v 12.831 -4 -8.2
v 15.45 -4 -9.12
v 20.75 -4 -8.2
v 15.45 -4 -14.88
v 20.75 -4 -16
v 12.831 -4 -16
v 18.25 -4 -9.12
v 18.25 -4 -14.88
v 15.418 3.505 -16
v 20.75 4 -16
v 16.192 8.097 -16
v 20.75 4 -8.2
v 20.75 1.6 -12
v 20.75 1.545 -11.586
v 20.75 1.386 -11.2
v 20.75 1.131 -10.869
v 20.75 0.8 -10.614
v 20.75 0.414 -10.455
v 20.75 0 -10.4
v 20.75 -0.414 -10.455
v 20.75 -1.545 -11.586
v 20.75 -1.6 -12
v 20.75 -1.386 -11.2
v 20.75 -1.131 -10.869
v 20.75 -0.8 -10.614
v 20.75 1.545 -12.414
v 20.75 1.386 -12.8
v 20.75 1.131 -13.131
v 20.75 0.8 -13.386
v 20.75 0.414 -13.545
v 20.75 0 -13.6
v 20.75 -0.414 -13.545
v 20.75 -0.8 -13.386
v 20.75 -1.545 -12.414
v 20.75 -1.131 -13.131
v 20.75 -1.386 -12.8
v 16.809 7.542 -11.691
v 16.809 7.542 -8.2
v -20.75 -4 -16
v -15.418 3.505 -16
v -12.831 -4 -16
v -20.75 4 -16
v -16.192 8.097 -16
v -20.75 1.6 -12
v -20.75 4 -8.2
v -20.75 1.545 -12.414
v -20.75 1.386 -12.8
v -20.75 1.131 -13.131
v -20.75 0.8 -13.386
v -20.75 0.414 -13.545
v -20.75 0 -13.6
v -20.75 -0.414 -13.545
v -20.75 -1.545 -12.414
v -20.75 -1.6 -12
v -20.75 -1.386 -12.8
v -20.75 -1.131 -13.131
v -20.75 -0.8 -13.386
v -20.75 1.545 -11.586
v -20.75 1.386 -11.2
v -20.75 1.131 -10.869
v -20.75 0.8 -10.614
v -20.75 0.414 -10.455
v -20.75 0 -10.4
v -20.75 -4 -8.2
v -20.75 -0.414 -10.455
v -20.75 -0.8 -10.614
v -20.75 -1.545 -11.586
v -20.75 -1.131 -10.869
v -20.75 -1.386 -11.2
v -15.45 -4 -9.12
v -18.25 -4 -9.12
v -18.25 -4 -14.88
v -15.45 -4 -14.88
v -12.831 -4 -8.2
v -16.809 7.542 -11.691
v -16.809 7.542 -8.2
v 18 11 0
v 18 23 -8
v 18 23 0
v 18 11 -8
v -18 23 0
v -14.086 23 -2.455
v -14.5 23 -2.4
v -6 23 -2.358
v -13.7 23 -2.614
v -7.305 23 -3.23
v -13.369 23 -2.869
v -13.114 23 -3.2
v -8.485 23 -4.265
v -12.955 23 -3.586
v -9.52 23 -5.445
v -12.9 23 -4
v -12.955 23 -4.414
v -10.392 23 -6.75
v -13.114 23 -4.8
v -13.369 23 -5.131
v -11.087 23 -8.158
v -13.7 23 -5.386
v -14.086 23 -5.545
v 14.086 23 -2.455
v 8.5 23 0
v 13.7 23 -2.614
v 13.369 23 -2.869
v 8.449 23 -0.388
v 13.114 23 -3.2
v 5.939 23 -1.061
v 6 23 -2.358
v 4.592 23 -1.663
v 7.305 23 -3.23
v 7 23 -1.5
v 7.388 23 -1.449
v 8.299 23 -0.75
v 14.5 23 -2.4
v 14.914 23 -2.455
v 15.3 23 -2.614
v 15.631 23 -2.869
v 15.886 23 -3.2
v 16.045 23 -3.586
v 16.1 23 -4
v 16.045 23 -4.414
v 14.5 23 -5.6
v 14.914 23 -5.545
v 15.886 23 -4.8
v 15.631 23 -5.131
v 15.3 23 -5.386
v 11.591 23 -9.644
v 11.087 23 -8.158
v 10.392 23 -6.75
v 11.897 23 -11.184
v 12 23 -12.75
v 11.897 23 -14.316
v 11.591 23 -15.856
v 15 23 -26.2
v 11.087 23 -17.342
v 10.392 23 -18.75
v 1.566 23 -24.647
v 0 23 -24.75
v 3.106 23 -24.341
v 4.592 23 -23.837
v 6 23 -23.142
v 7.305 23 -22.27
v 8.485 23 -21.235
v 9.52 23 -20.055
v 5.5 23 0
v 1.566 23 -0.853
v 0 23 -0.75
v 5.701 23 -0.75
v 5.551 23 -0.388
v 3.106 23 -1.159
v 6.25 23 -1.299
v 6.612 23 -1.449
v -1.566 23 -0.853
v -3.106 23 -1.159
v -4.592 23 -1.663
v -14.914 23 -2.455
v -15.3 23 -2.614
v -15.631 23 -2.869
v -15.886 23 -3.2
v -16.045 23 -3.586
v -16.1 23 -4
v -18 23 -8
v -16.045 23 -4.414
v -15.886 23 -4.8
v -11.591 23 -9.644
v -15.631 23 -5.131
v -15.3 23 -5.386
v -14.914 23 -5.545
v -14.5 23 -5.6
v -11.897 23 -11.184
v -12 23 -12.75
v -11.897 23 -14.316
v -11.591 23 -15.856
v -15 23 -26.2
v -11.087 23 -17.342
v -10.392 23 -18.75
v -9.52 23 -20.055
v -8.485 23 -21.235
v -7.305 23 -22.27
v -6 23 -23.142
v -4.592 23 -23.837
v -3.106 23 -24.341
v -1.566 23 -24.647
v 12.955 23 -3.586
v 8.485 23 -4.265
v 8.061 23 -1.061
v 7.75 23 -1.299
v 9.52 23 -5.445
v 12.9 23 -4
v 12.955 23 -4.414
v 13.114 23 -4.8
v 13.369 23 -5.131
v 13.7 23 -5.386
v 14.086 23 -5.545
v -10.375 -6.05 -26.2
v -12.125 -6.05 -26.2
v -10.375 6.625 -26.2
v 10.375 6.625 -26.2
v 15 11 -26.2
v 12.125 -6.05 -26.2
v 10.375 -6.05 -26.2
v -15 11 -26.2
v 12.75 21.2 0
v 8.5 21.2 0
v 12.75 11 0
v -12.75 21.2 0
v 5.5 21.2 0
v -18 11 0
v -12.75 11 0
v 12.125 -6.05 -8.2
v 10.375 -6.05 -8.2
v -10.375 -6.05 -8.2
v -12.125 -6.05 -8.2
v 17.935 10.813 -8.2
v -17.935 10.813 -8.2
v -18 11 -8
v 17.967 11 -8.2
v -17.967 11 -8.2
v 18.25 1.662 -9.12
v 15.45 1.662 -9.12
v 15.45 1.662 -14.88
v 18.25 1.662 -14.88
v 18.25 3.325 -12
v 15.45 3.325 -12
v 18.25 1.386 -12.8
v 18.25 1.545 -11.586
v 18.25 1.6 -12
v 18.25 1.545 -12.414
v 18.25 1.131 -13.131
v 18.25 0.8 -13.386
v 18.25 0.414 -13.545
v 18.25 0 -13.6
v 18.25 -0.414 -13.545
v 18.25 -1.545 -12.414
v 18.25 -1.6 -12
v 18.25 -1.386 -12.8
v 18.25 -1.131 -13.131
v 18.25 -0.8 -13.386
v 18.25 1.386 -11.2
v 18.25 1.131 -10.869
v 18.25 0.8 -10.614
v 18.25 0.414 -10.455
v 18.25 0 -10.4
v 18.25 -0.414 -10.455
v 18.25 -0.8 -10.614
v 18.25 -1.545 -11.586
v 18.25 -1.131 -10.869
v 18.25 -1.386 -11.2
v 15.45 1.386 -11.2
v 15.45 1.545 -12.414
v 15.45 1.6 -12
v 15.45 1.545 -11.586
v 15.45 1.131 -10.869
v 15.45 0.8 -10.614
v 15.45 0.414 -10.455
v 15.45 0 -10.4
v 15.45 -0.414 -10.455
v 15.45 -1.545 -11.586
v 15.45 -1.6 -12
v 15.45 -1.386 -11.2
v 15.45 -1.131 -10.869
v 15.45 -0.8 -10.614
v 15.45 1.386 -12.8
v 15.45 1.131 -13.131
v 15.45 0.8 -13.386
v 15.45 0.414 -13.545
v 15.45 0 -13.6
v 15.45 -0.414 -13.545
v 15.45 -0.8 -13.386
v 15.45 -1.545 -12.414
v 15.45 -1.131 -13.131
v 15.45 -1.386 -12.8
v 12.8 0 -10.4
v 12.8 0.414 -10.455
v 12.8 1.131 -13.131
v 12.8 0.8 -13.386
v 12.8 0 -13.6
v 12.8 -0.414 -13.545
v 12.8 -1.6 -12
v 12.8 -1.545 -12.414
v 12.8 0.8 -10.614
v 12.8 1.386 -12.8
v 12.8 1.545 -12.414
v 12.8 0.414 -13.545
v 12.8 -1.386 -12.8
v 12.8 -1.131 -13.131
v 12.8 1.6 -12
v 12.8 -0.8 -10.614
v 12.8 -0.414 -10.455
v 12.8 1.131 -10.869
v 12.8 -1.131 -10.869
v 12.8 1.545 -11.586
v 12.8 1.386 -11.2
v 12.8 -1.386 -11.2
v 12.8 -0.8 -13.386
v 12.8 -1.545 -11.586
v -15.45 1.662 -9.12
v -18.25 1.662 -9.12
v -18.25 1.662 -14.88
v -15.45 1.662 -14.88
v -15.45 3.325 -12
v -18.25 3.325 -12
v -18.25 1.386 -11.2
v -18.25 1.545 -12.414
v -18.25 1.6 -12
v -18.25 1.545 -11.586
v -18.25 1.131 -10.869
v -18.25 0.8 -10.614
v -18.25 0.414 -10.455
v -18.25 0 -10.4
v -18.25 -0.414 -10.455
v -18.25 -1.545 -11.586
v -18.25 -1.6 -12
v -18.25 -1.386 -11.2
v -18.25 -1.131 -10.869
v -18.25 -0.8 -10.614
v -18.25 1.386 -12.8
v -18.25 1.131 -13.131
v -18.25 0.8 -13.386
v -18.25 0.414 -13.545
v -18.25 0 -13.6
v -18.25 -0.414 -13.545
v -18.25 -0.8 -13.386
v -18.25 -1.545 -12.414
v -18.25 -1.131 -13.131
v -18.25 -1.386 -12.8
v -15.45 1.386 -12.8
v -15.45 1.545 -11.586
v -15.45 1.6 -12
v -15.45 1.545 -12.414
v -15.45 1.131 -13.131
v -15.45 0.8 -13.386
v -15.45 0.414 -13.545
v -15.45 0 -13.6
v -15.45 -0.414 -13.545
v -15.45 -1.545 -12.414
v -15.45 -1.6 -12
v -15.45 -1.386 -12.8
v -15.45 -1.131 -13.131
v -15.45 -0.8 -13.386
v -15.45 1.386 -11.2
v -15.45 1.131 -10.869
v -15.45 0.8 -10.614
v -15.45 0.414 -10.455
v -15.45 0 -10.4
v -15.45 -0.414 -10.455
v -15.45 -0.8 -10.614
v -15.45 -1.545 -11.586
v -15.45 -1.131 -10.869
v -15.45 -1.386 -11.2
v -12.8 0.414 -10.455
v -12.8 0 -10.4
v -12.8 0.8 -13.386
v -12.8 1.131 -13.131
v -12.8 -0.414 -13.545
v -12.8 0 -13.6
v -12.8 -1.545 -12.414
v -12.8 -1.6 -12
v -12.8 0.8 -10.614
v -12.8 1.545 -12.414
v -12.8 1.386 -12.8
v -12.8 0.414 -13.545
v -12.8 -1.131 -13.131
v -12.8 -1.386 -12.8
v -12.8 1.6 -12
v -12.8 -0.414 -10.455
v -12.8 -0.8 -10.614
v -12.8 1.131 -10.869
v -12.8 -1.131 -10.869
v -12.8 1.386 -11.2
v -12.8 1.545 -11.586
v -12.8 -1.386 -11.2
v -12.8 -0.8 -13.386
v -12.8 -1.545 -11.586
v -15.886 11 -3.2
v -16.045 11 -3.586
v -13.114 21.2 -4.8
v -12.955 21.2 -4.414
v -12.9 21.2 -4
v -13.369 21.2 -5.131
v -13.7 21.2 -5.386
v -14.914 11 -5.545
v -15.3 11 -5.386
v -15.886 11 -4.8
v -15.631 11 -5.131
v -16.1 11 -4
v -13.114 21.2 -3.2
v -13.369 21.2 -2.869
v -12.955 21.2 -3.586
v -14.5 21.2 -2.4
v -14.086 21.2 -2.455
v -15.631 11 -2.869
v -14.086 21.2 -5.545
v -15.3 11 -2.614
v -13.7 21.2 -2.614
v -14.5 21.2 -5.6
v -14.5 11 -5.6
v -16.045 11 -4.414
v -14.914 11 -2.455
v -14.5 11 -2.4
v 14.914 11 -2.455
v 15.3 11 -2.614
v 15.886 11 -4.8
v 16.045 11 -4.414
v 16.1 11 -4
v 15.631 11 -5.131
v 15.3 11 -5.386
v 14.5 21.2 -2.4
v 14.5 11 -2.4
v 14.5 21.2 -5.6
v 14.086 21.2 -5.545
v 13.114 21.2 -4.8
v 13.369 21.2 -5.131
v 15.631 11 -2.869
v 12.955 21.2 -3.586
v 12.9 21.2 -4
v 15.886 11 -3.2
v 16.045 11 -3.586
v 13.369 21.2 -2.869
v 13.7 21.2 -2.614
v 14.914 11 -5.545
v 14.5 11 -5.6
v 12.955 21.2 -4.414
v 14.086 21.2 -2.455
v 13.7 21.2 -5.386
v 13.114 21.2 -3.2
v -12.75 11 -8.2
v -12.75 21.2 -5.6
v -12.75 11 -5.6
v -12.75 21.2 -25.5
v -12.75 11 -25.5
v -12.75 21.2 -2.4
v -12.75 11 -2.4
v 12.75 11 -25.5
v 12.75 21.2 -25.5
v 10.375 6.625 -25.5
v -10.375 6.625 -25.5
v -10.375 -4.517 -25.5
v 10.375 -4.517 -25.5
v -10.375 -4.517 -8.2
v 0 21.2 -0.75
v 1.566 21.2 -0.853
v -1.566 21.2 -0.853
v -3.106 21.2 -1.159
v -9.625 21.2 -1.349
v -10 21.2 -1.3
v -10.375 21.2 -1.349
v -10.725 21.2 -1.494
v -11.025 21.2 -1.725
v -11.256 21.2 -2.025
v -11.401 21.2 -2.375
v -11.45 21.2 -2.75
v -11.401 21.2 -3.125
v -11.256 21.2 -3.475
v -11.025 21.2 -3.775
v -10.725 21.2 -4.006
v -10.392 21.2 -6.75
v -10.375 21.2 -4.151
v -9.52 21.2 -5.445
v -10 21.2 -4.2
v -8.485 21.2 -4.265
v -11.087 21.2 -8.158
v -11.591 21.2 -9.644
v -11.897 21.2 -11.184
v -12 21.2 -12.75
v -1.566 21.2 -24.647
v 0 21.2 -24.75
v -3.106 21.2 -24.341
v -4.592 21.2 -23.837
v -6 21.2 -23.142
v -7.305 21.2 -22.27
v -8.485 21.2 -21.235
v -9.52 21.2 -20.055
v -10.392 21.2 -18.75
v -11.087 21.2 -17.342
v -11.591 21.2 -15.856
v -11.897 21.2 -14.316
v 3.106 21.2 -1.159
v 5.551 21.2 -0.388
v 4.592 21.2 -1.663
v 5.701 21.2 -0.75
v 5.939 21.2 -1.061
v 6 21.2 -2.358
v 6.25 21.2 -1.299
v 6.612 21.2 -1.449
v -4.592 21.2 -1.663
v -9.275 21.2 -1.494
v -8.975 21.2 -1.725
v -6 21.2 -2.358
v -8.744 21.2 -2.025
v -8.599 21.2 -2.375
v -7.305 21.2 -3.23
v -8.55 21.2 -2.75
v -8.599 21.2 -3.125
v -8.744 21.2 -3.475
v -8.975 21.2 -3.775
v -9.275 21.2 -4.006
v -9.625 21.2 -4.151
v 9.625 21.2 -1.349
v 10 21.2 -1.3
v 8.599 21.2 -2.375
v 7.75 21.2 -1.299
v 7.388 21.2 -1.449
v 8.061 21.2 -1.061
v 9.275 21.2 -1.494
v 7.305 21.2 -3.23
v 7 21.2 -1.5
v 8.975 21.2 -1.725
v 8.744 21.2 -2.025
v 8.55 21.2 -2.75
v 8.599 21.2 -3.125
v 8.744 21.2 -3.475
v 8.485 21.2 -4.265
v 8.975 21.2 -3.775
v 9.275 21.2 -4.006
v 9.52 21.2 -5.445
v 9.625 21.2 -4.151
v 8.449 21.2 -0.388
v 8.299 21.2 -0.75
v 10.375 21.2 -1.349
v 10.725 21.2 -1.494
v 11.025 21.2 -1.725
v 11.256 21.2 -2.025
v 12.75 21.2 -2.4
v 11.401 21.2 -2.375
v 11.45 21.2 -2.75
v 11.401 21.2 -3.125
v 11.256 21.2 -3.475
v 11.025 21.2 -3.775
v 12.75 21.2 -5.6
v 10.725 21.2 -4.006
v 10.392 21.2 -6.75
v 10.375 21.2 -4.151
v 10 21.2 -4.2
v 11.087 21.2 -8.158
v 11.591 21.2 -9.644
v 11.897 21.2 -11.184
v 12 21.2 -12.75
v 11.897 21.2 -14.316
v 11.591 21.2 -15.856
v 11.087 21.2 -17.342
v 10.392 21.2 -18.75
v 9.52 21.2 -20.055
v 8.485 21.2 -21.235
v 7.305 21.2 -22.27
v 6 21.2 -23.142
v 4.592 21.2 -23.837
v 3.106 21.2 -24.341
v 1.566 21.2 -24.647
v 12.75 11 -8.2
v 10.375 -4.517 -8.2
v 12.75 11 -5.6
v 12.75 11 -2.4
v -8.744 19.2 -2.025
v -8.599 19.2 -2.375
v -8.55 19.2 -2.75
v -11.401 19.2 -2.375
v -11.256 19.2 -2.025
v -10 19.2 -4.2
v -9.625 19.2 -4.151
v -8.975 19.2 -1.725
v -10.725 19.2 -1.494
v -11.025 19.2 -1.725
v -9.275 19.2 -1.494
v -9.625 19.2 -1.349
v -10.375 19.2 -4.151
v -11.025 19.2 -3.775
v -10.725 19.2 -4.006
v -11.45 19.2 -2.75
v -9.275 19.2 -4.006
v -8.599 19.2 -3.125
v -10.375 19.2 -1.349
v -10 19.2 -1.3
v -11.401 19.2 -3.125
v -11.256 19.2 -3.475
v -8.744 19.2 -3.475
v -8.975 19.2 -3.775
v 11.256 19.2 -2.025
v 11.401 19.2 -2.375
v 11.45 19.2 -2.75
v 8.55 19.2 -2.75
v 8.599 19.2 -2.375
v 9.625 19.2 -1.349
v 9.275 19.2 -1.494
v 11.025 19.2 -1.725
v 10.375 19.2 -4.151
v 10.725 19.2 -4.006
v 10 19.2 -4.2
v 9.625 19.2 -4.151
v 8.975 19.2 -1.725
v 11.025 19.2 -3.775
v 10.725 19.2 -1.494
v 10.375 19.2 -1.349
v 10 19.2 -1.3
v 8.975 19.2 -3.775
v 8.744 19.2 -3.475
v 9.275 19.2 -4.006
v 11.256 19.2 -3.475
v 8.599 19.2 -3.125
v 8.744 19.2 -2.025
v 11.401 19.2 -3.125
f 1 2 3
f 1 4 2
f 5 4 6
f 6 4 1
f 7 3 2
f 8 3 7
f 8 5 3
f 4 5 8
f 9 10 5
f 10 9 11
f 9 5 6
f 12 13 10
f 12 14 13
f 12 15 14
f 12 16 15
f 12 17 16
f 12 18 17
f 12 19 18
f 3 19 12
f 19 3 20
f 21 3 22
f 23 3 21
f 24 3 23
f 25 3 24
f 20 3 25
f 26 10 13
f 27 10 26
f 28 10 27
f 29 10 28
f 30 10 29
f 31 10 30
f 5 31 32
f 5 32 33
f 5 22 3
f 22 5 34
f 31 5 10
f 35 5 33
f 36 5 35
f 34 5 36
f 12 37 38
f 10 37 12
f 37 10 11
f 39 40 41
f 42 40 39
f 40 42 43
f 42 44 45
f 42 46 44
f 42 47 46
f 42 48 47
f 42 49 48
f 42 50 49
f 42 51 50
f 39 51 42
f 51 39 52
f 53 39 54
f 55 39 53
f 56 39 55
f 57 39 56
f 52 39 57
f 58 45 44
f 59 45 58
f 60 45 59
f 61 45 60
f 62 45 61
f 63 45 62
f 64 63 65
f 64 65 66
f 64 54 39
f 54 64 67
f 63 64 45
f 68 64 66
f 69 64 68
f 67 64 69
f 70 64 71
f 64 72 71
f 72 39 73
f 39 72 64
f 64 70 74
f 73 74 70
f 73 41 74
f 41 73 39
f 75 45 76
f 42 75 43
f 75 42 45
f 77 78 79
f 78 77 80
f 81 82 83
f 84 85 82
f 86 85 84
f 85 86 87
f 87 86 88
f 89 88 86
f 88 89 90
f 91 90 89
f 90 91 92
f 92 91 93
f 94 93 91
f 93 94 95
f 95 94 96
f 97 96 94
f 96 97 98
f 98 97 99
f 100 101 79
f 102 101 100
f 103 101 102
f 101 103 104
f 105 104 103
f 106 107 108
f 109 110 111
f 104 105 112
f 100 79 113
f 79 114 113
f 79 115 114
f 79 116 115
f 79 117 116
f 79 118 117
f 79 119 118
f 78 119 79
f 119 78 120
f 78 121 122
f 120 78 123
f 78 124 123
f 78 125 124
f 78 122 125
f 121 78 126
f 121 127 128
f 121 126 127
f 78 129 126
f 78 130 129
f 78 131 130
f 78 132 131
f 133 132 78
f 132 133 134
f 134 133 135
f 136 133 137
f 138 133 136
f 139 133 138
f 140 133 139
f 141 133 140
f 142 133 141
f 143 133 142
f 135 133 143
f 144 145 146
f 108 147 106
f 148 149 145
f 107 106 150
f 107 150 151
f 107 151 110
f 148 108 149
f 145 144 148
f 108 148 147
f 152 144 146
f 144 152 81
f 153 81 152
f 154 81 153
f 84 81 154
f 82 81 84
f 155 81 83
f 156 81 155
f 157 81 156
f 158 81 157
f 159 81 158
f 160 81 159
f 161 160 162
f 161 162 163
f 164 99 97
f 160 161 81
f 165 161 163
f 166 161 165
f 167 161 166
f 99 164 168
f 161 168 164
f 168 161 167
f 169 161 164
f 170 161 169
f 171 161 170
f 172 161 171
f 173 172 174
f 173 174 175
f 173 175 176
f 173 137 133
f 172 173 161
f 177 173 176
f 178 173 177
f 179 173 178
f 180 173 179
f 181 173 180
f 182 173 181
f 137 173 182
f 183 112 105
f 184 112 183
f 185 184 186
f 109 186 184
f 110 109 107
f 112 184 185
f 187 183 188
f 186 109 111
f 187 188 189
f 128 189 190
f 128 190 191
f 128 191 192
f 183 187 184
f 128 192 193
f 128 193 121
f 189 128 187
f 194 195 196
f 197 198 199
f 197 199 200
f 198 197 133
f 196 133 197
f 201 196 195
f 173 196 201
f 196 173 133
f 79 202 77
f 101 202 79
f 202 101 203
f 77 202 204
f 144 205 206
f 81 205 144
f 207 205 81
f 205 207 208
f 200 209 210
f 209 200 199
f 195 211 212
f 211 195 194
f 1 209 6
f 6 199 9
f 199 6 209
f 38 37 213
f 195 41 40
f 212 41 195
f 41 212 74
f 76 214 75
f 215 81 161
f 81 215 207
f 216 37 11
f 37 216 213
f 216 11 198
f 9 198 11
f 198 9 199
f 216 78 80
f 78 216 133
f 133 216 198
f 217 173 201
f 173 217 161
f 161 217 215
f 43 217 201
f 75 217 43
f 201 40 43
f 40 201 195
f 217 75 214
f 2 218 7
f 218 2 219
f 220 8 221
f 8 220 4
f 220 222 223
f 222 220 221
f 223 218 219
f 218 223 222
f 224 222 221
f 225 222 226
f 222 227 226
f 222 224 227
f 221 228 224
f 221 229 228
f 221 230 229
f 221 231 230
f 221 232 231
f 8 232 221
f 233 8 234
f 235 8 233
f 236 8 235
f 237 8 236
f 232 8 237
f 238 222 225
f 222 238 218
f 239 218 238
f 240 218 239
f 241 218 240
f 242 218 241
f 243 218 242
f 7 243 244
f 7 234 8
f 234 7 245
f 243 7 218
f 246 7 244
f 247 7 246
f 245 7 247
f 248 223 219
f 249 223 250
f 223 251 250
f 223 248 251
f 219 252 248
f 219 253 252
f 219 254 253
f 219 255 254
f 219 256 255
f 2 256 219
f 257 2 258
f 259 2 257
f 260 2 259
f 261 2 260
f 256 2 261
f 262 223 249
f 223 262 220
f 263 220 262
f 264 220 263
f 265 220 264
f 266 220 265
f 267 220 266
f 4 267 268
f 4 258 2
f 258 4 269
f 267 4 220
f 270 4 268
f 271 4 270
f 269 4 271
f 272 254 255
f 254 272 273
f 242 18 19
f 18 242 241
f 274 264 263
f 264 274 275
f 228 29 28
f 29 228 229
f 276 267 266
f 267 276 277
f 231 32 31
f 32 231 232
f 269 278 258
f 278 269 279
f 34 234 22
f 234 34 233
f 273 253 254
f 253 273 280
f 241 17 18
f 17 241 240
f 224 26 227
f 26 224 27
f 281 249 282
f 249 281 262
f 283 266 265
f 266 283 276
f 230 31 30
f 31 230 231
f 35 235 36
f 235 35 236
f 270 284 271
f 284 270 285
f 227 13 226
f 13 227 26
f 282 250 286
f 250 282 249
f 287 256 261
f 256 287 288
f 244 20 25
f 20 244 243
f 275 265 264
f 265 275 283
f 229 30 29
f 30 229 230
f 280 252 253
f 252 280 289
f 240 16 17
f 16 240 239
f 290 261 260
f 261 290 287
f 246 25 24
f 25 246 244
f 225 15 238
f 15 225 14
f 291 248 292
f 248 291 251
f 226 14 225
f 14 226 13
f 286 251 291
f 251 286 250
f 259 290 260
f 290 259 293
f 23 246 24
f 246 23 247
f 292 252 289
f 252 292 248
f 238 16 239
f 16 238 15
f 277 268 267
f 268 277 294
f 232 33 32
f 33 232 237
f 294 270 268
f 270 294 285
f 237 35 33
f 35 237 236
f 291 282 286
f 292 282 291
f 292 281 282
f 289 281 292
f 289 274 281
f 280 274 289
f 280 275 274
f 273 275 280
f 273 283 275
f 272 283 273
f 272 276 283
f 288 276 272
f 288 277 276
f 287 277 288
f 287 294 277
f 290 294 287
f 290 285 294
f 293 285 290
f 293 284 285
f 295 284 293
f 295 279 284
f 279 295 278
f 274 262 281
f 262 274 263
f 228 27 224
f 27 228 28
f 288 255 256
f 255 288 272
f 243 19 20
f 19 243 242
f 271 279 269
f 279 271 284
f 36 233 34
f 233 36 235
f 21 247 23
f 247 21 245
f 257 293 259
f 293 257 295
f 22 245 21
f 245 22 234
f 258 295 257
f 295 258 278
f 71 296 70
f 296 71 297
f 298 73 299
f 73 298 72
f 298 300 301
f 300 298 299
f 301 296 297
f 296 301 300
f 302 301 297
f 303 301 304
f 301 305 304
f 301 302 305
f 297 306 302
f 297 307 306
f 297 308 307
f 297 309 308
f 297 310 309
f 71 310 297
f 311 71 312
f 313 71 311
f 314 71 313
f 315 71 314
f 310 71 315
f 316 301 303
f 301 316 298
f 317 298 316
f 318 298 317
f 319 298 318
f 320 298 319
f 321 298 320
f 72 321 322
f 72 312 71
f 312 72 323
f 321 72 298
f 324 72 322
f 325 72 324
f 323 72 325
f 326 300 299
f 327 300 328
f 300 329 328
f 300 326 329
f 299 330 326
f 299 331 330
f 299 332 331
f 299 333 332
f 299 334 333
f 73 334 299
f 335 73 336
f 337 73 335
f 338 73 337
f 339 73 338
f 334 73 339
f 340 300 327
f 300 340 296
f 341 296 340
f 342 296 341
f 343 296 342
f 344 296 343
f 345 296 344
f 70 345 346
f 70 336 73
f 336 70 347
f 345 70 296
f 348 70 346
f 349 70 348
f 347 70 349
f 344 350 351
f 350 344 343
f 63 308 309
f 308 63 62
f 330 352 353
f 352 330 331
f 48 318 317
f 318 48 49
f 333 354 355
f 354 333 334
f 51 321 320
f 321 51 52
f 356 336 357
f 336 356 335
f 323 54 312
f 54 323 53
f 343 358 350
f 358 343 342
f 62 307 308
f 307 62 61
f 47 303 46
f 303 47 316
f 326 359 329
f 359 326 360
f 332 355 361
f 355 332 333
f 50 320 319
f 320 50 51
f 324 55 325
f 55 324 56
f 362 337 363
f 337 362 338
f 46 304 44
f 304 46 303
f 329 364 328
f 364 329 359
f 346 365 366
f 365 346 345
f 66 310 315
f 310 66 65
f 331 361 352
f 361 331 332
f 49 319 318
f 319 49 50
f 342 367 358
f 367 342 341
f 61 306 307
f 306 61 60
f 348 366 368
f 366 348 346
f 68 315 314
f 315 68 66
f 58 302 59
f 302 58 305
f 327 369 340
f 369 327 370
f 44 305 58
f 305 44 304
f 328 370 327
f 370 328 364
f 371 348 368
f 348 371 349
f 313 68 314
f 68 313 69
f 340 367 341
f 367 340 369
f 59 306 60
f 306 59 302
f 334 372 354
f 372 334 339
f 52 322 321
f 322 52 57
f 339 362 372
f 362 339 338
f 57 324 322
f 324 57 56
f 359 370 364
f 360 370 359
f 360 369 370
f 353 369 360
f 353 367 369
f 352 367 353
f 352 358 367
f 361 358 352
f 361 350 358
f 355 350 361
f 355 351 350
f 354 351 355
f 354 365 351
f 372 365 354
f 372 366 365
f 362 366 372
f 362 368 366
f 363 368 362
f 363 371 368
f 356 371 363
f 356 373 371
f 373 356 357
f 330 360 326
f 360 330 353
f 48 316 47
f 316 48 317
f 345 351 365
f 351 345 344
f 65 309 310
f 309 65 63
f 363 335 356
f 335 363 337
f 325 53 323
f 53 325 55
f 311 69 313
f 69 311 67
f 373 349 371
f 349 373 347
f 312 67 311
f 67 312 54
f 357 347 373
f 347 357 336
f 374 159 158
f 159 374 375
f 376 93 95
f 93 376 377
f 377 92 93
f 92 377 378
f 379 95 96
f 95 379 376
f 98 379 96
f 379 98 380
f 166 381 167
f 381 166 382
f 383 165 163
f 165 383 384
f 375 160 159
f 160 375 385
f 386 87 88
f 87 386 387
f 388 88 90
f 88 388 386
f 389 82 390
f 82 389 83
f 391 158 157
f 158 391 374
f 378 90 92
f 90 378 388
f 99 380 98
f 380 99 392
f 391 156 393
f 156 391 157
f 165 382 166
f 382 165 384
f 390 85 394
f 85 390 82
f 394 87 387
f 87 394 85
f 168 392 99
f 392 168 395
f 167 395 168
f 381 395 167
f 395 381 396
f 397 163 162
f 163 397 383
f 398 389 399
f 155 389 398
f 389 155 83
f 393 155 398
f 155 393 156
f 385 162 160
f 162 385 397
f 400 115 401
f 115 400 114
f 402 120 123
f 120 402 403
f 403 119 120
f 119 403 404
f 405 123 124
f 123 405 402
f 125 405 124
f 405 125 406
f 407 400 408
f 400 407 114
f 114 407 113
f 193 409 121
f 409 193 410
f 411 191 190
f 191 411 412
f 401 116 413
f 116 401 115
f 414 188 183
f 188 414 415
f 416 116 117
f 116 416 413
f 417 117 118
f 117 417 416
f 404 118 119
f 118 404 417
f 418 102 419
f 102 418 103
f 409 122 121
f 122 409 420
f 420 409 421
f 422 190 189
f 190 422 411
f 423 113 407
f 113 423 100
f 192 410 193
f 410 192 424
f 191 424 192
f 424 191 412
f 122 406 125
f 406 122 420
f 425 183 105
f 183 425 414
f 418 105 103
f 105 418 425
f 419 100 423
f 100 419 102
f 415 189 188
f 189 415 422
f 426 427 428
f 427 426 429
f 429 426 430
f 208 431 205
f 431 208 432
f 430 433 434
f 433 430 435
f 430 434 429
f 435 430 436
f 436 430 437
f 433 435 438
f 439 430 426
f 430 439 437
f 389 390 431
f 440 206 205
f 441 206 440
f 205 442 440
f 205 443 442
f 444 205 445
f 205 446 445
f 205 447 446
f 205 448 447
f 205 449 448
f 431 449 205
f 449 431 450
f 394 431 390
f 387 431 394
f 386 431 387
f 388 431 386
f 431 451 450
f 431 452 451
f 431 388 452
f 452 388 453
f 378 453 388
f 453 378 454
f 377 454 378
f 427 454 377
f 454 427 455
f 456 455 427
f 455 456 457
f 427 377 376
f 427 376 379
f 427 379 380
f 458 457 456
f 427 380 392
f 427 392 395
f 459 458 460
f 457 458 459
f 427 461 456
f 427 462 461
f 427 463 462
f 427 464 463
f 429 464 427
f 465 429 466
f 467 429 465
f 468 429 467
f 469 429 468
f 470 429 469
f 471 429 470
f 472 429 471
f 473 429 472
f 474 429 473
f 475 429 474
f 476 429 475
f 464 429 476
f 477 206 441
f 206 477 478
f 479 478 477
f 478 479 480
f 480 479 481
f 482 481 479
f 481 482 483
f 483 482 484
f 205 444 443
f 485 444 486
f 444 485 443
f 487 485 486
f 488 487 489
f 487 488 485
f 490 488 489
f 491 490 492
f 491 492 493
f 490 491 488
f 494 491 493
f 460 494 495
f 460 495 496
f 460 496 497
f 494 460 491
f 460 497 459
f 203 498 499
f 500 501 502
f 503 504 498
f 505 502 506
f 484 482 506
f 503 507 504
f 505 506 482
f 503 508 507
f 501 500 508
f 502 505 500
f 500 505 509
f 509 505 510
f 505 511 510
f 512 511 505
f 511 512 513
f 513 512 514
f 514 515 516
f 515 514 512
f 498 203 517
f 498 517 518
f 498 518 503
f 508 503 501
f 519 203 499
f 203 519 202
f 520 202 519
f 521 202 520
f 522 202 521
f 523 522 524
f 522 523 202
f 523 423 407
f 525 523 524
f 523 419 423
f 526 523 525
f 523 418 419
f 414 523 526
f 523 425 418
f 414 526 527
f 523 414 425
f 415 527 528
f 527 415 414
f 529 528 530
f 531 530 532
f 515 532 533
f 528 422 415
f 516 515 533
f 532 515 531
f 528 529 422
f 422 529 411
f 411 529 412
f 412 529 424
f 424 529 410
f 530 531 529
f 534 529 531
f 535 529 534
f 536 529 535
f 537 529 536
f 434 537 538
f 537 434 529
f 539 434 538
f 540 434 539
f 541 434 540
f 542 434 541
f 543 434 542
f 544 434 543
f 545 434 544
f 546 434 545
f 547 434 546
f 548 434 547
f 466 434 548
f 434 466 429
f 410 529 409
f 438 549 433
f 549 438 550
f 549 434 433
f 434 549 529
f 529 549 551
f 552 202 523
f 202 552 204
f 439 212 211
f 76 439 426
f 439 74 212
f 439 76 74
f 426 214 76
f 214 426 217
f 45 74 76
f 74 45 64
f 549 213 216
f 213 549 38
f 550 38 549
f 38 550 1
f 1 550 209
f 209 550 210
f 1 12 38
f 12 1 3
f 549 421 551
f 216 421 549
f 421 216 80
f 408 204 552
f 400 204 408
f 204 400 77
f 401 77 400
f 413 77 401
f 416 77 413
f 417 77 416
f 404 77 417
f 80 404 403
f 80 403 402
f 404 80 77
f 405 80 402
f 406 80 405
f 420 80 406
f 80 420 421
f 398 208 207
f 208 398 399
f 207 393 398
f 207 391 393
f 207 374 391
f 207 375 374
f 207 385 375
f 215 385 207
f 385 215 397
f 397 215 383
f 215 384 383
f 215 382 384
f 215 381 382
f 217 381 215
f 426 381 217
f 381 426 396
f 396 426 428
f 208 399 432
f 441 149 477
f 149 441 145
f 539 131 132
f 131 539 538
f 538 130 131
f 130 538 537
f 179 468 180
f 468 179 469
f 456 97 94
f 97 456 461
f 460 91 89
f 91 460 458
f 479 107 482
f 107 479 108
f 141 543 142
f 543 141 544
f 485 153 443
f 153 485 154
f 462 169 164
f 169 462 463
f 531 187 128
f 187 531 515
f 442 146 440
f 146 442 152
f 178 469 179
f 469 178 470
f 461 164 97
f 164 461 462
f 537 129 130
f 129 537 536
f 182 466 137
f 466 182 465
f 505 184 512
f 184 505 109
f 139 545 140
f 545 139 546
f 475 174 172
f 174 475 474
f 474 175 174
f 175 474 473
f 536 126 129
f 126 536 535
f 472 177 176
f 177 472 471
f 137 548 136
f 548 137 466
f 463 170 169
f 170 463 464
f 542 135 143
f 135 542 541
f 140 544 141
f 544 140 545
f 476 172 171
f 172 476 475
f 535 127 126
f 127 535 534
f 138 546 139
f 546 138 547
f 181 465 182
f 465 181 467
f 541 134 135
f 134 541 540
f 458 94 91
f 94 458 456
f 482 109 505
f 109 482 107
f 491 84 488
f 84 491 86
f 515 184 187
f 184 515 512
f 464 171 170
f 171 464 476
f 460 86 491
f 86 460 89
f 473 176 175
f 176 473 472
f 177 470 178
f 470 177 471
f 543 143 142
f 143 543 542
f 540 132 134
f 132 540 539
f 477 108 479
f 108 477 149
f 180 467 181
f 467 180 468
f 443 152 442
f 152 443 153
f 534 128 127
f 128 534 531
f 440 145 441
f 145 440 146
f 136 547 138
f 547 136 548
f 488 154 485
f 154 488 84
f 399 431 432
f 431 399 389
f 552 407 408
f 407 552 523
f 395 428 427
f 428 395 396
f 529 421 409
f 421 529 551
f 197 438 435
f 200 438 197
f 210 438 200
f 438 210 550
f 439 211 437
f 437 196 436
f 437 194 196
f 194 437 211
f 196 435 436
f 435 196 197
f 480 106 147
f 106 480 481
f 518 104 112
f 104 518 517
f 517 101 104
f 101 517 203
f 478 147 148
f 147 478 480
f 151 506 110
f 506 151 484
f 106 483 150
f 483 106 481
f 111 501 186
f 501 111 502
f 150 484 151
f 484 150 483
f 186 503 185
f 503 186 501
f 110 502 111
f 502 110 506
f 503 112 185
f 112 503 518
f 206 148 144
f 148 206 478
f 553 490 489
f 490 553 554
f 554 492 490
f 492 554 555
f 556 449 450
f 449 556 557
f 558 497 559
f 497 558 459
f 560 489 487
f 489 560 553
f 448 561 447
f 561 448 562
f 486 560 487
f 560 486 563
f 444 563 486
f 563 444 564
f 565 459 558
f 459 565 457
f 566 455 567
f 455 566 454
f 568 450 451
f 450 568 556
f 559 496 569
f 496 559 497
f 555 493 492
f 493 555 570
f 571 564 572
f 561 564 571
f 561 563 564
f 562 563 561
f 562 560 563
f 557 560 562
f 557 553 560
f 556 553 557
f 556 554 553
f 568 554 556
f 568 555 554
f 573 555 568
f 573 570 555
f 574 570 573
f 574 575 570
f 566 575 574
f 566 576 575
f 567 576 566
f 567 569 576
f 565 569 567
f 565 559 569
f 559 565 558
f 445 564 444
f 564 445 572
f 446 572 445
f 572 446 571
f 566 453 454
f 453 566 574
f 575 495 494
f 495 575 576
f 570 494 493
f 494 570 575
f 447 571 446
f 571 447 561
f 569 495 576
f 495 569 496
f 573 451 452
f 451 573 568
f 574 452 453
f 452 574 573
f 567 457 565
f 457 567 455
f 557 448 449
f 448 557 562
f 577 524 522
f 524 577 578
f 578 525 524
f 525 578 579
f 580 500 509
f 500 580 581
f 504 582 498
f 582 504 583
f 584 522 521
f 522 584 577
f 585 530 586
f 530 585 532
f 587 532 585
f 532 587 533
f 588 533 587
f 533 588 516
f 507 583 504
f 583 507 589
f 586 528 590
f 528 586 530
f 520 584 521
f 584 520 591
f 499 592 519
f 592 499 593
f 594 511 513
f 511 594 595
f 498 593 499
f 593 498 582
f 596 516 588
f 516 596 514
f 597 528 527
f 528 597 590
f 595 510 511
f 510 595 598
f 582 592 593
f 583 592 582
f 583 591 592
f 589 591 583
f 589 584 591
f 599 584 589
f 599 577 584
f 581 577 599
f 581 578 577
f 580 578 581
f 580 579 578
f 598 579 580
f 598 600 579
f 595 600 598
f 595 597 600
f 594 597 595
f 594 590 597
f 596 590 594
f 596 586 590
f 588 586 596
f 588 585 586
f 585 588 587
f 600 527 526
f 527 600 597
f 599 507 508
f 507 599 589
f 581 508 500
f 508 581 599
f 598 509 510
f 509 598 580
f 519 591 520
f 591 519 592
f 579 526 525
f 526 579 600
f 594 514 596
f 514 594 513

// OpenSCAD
// file: ../OpenSCAD_Modules/cube_vround.scad
module cube_vround(
	size=[10,10,10],
	round_corners=[true,true,true,true],
	rounding=3,
	center_xy=false,
	center_z=false,
	attach=0,
	wall_attach=0,
	quality=2, //integer from 1 to infinity
)
{
	assert(len(size)==3);
	assert(len(round_corners)==4);
	assert(rounding>0);
	assert(rounding<=size[0]/2);
	assert(rounding<=size[1]/2);
	assert(quality>0);
	assert(attach>=0);
	assert(wall_attach>=0);
	height=size[2]+attach;
	cyl_r=rounding+wall_attach;
	cyl_mvx=size[0]/2-rounding;
	cyl_mvy=size[1]/2-rounding;
	cube_szx=size[0]/2;
	cube_szy=size[1]/2;
	cube_mvx=cube_szx/2+wall_attach;
	cube_mvy=cube_szy/2+wall_attach;
	translate([center_xy?0:cube_szx,center_xy?0:cube_szy,center_z?-attach/2:(size[2]-attach)/2])
		hull()
		{
			if(round_corners[0])
				translate([cyl_mvx,cyl_mvy])
					cylinder(r=cyl_r,h=height,$fn=12*quality,center=true);
			else
				translate([cube_mvx,cube_mvy])
					cube([cube_szx,cube_szy,height],center=true);
			if(round_corners[1])
				translate([cyl_mvx,-cyl_mvy])
					cylinder(r=cyl_r,h=height,$fn=12*quality,center=true);
			else
				translate([cube_mvx,-cube_mvy])
					cube([cube_szx,cube_szy,height],center=true);
			if(round_corners[2])
				translate([-cyl_mvx,-cyl_mvy])
					cylinder(r=cyl_r,h=height,$fn=12*quality,center=true);
			else
				translate([-cube_mvx,-cube_mvy])
					cube([cube_szx,cube_szy,height],center=true);
			if(round_corners[3])
				translate([-cyl_mvx,cyl_mvy])
					cylinder(r=cyl_r,h=height,$fn=12*quality,center=true);
			else
				translate([-cube_mvx,cube_mvy])
					cube([cube_szx,cube_szy,height],center=true);
		};
}

//example
cube_vround(round_corners=[true,false,true,false],
size=[10,20,6],
attach=0.1,
wall_attach=0.1,
rounding=3,
center_xy=true,center_z=false);
// file: HotendMount.scad
use <EffectorMount_Alt.scad>

module NutPocket
(
	nut_diam=6.65,
	pocket_len=100,
)
{
	m=(nut_diam/2)*sqrt(3)/2;
	cylinder(d=nut_diam,h=pocket_len,center=false,$fn=6);
}

module VNutPocket
(
	nut_diam=6.65,
	nut_height=2.8,
	pocket_len=10,
)
{
	m=(nut_diam/2)*sqrt(3)/2;
	rotate(a=90,v=[0,0,1])
		rotate(a=90,v=[0,-1,0])
			union()
			{
				cylinder(d=nut_diam,h=nut_height,center=true,$fn=6);
				translate([pocket_len/2,0,0])
				cube(size=[pocket_len,m*2,nut_height],center=true);
			}
}

module HotendMount
(
	//mount base parameters
	center_hole_diam=4.6,
	side_hole_diam=3.2,
	side_hole1_pos=[-14,-3],
	side_hole2_pos=[19,-3],
	base_points=[[-18,-12],[24,-12],[24,11],[-18,11]],
	base_height=8,
	side_holes_nut_depth=3,
	//hotend block params
	hotend_block_size=[20.25,12.1,27],
	hotend_block_front=11,
	hotend_block_back=12,
	hotend_screws_diam=3.2,
	hotend_screws_diff=14,
	hotend_screws_z_shift=-4,
	hotend_screws_nut_depth=3,
	hotend_screws_cap_diam=7,
	hotend_screws_cap_depth=3.25,
	//hotend cooler params
	cooler_mount_screws_diff=29,
	cooler_mount_screws_z_shift=-4,
	cooler_mount_screws_diam=3.2,
	cooler_mount_screws_y_shift=2,
	cooler_nut_pocket_depth=3,
	cooler_nut_pocket_y_shift=6,
	//z probe mount params
	z_probe_screw_diam=3.2,
	z_probe_nut_pocket_depth=3,
	z_probe_screw_z_shift=-4,
	quality=2,
)
{
	cutClr=0.1;
	difference()
	{
		//mount base
		translate([0,0,-base_height])
		linear_extrude(height=base_height)
		polygon(points=base_points);

		//central shaft
		translate([0,0,-base_height-cutClr])
		cylinder(d=center_hole_diam,h=base_height+2*cutClr,$fn=quality*12);

		//left mount hole
		translate([side_hole1_pos[0],side_hole1_pos[1],-base_height-cutClr])
		cylinder(d=side_hole_diam,h=base_height+2*cutClr,$fn=quality*12);

		translate([side_hole1_pos[0],side_hole1_pos[1],-base_height+side_holes_nut_depth])
		rotate(a=90,v=[0,0,1])
		rotate(a=180,v=[1,0,0])
		NutPocket(pocket_len=side_holes_nut_depth+cutClr);

		//right mount hole
		translate([side_hole2_pos[0],side_hole2_pos[1],-base_height-cutClr])
		cylinder(d=side_hole_diam,h=base_height+2*cutClr,$fn=quality*12);

		translate([side_hole2_pos[0],side_hole2_pos[1],-base_height+side_holes_nut_depth])
		rotate(a=90,v=[0,0,1])
		rotate(a=180,v=[1,0,0])
		NutPocket(pocket_len=side_holes_nut_depth+cutClr);

		//hotend block cut
		translate([-hotend_block_size[0]/2, -hotend_block_size[1]/2, -hotend_block_size[2]-cutClr])
		cube(size=[hotend_block_size[0],hotend_block_size[1],hotend_block_size[2]+2*cutClr],center=false);

		//hotend block screws
		for(i=[-1,1])
		{
			translate([i*hotend_screws_diff/2,-hotend_block_back,hotend_screws_z_shift])
			{
				rotate(a=-90,v=[1,0,0])
				cylinder(d=hotend_screws_diam,h=hotend_block_back+hotend_block_front,center=false,$fn=quality*12);

				translate([0,hotend_screws_nut_depth,0])
				rotate(a=90,v=[1,0,0])
				NutPocket(pocket_len=hotend_screws_nut_depth+cutClr);

				translate([0,hotend_block_back+hotend_block_front+cutClr,0])
				rotate(a=90,v=[1,0,0])
				cylinder(d=hotend_screws_cap_diam,h=hotend_screws_cap_depth+cutClr,center=false,$fn=quality*12);
			}
		}

		//cooler mount screws
		for(i=[-1,1])
		{
			translate([i*cooler_mount_screws_diff/2,cooler_mount_screws_y_shift,cooler_mount_screws_z_shift])
			rotate(a=-90,v=[1,0,0])
			cylinder(d=cooler_mount_screws_diam,h=hotend_block_front+cutClr,center=false,$fn=quality*12);

			translate([i*cooler_mount_screws_diff/2,cooler_nut_pocket_y_shift,cooler_mount_screws_z_shift])
			rotate(a=180,v=[1,0,0])
			VNutPocket(pocket_len=base_height,nut_height=cooler_nut_pocket_depth);
		}

		//z probe mount hole
		translate([0,0,z_probe_screw_z_shift])
		rotate(a=90,v=[1,0,0])
		cylinder(d=z_probe_screw_diam,h=hotend_block_back+cutClr,center=false,$fn=quality*12);
		//z probe mount pocket
		translate([0,-hotend_block_size[1]/2+cutClr,z_probe_screw_z_shift])
		rotate(a=90,v=[1,0,0])
		NutPocket(pocket_len=z_probe_nut_pocket_depth+cutClr);
	}
}

//color([0.25,0.25,0.25])
//EffectorMount(center_xy=true,center_z=true,rotate_motor=true);

HotendMount();
// main file
use <HotendMount.scad>

module VNutPocket
(
	nut_diam=6.65,
	nut_height=2.8,
	pocket_len=10,
)
{
	m=(nut_diam/2)*sqrt(3)/2;
	rotate(a=90,v=[0,0,1])
		rotate(a=90,v=[0,-1,0])
			union()
			{
				cylinder(d=nut_diam,h=nut_height,center=true,$fn=6);
				translate([pocket_len/2,0,0])
				cube(size=[pocket_len,m*2,nut_height],center=true);
			}
}

module FanMount
(
	//hotend block params
	hotend_size=[20.25,12.1,27],
	hotend_cut_size=[20.75,13.25,27],
	hotend_front=11,
	hotend_mount_height=8,
	//shell
	shell_wall_size=2,
	extra_top_cut=0.2,
	//25x25 fan mount
	fan_size=[25.5,10.2,25.5],
	fan_air_hole_diam=24,
	fan_mount_size=[36,30,12,26.2],
	fan_mount_screws_diff=29,
	fan_mount_screws_z_shift=-4,
	fan_mount_screws_diam=3.2,
	//internal pins
	fan_clips_pins_diff=[20,20],
	fan_clips_pins_diam=2.9,
	fan_clips_pins_height=2,
	fan_clips_wires_cut_diam=3,
	fan_clips_wires_x_shift=7,
	//part fan clip ports
	part_fan_clip_size=[8,8,8],
	part_fan_clip_screws_diam=3.2,
	//other
	quality=2,
)
{
	cutClr=0.1;
	hotend_back=hotend_size[1]/2;

	union()
	{
		difference()
		{
			//outer hull
			union()
			{
				hull()
				{
					//fan mount top clip
					translate([-fan_mount_size[0]/2,hotend_front,-hotend_mount_height])
					cube(size=[fan_mount_size[0],fan_mount_size[2],hotend_mount_height],center=false);

					//fan mount main body
					translate([-fan_mount_size[1]/2,hotend_front,-fan_mount_size[3]])
					cube(size=[fan_mount_size[1],fan_mount_size[2],fan_mount_size[3]],center=false);

					//shroud outer shell
					shroud_width=hotend_size[0]+2*shell_wall_size;
					translate([-shroud_width/2,-hotend_back,-fan_mount_size[3]])
					cube(size=[shroud_width,hotend_back+hotend_front+cutClr,fan_mount_size[3]],center=false);
				}

				//part fan clips
				for(i=[0,1])
				mirror(v=[i,0,0])
				{
					hull()
					{
						translate([fan_size[0]/2+part_fan_clip_size[0]/2,0,-hotend_mount_height-part_fan_clip_size[2]/2])
						cube(size=part_fan_clip_size,center=true);
						translate([fan_size[0]/2+cutClr/2,hotend_front+cutClr/2,-hotend_mount_height-part_fan_clip_size[2]/2])
						cube(size=[cutClr,cutClr,part_fan_clip_size[2]],center=true);
					}
				}
			}

			//part fan clip-cuts
			for(i=[0,1])
			mirror(v=[i,0,0])
			translate([fan_size[0]/2+part_fan_clip_size[0]/2+cutClr,0,-hotend_mount_height-part_fan_clip_size[2]/2])
			{
				rotate(a=90,v=[0,1,0])
				cylinder(d=part_fan_clip_screws_diam,h=part_fan_clip_size[0]+cutClr,center=true,$fn=quality*12);
				rotate(a=90,v=[1,0,0])
				rotate(a=90,v=[0,0,1])
				VNutPocket();
			}

			//inner hull
			hull()
			{
				//fan mount inner cut
				translate([-fan_size[0]/2,hotend_front,-fan_size[2]])
				cube(size=[fan_size[0],fan_size[1],fan_size[2]+cutClr],center=false);

				translate([-hotend_size[0]/2,-hotend_back-cutClr,-fan_size[2]])
				cube(size=[hotend_size[0],hotend_back+hotend_front+2*cutClr,fan_size[2]+cutClr],center=false);
			}

			//hotend mount top cut
			translate([-fan_mount_size[0]/2-cutClr-part_fan_clip_size[0],-hotend_back-cutClr,-hotend_mount_height-extra_top_cut])
			cube(size=[fan_mount_size[0]+2*cutClr+2*part_fan_clip_size[0],hotend_front+hotend_back+cutClr,hotend_mount_height+extra_top_cut+cutClr],center=false);

			//fan mount air hole
			translate([0,hotend_front,-fan_size[2]/2])
			rotate(a=-90,v=[1,0,0])
			cylinder(d=fan_air_hole_diam,h=fan_mount_size[2]+cutClr,center=false,$fn=quality*24);

			//case mount screw holes
			for(i=[-1,1])
			translate([i*fan_mount_screws_diff/2,hotend_front-cutClr,fan_mount_screws_z_shift])
			rotate(a=-90,v=[1,0,0])
			cylinder(d=fan_mount_screws_diam,h=fan_mount_size[2]+2*cutClr,center=false,$fn=quality*12);

			translate([0,hotend_front+fan_size[1]/2-cutClr/2,fan_mount_screws_z_shift])
			cube(size=[fan_mount_screws_diff,fan_size[1]+cutClr,fan_mount_screws_diam],center=true);

			//hotend block cut
			translate([-hotend_cut_size[0]/2,-hotend_cut_size[1]/2,-hotend_cut_size[2]])
			cube(size=[hotend_cut_size[0],hotend_cut_size[1],hotend_cut_size[2]],center=false);

			//fan wires cut
			translate([fan_clips_wires_x_shift,hotend_front,0])
			rotate(a=-90,v=[1,0,0])
			cylinder(d=fan_clips_wires_cut_diam,h=fan_mount_size[2]+cutClr,center=false,$fn=quality*12);
		}

		//fan clipping pins
		for(i=[-1,1],j=[1])
		translate([i*fan_clips_pins_diff[0]/2,hotend_front+fan_size[1]+cutClr,j*fan_clips_pins_diff[1]/2-fan_size[2]/2])
		rotate(a=90,v=[1,0,0])
		cylinder(d=fan_clips_pins_diam,h=fan_clips_pins_height+cutClr,center=false,$fn=quality*12);
	}
}

FanMount();

if($preview)
color([1,1,1,0.25])
render() HotendMount();
